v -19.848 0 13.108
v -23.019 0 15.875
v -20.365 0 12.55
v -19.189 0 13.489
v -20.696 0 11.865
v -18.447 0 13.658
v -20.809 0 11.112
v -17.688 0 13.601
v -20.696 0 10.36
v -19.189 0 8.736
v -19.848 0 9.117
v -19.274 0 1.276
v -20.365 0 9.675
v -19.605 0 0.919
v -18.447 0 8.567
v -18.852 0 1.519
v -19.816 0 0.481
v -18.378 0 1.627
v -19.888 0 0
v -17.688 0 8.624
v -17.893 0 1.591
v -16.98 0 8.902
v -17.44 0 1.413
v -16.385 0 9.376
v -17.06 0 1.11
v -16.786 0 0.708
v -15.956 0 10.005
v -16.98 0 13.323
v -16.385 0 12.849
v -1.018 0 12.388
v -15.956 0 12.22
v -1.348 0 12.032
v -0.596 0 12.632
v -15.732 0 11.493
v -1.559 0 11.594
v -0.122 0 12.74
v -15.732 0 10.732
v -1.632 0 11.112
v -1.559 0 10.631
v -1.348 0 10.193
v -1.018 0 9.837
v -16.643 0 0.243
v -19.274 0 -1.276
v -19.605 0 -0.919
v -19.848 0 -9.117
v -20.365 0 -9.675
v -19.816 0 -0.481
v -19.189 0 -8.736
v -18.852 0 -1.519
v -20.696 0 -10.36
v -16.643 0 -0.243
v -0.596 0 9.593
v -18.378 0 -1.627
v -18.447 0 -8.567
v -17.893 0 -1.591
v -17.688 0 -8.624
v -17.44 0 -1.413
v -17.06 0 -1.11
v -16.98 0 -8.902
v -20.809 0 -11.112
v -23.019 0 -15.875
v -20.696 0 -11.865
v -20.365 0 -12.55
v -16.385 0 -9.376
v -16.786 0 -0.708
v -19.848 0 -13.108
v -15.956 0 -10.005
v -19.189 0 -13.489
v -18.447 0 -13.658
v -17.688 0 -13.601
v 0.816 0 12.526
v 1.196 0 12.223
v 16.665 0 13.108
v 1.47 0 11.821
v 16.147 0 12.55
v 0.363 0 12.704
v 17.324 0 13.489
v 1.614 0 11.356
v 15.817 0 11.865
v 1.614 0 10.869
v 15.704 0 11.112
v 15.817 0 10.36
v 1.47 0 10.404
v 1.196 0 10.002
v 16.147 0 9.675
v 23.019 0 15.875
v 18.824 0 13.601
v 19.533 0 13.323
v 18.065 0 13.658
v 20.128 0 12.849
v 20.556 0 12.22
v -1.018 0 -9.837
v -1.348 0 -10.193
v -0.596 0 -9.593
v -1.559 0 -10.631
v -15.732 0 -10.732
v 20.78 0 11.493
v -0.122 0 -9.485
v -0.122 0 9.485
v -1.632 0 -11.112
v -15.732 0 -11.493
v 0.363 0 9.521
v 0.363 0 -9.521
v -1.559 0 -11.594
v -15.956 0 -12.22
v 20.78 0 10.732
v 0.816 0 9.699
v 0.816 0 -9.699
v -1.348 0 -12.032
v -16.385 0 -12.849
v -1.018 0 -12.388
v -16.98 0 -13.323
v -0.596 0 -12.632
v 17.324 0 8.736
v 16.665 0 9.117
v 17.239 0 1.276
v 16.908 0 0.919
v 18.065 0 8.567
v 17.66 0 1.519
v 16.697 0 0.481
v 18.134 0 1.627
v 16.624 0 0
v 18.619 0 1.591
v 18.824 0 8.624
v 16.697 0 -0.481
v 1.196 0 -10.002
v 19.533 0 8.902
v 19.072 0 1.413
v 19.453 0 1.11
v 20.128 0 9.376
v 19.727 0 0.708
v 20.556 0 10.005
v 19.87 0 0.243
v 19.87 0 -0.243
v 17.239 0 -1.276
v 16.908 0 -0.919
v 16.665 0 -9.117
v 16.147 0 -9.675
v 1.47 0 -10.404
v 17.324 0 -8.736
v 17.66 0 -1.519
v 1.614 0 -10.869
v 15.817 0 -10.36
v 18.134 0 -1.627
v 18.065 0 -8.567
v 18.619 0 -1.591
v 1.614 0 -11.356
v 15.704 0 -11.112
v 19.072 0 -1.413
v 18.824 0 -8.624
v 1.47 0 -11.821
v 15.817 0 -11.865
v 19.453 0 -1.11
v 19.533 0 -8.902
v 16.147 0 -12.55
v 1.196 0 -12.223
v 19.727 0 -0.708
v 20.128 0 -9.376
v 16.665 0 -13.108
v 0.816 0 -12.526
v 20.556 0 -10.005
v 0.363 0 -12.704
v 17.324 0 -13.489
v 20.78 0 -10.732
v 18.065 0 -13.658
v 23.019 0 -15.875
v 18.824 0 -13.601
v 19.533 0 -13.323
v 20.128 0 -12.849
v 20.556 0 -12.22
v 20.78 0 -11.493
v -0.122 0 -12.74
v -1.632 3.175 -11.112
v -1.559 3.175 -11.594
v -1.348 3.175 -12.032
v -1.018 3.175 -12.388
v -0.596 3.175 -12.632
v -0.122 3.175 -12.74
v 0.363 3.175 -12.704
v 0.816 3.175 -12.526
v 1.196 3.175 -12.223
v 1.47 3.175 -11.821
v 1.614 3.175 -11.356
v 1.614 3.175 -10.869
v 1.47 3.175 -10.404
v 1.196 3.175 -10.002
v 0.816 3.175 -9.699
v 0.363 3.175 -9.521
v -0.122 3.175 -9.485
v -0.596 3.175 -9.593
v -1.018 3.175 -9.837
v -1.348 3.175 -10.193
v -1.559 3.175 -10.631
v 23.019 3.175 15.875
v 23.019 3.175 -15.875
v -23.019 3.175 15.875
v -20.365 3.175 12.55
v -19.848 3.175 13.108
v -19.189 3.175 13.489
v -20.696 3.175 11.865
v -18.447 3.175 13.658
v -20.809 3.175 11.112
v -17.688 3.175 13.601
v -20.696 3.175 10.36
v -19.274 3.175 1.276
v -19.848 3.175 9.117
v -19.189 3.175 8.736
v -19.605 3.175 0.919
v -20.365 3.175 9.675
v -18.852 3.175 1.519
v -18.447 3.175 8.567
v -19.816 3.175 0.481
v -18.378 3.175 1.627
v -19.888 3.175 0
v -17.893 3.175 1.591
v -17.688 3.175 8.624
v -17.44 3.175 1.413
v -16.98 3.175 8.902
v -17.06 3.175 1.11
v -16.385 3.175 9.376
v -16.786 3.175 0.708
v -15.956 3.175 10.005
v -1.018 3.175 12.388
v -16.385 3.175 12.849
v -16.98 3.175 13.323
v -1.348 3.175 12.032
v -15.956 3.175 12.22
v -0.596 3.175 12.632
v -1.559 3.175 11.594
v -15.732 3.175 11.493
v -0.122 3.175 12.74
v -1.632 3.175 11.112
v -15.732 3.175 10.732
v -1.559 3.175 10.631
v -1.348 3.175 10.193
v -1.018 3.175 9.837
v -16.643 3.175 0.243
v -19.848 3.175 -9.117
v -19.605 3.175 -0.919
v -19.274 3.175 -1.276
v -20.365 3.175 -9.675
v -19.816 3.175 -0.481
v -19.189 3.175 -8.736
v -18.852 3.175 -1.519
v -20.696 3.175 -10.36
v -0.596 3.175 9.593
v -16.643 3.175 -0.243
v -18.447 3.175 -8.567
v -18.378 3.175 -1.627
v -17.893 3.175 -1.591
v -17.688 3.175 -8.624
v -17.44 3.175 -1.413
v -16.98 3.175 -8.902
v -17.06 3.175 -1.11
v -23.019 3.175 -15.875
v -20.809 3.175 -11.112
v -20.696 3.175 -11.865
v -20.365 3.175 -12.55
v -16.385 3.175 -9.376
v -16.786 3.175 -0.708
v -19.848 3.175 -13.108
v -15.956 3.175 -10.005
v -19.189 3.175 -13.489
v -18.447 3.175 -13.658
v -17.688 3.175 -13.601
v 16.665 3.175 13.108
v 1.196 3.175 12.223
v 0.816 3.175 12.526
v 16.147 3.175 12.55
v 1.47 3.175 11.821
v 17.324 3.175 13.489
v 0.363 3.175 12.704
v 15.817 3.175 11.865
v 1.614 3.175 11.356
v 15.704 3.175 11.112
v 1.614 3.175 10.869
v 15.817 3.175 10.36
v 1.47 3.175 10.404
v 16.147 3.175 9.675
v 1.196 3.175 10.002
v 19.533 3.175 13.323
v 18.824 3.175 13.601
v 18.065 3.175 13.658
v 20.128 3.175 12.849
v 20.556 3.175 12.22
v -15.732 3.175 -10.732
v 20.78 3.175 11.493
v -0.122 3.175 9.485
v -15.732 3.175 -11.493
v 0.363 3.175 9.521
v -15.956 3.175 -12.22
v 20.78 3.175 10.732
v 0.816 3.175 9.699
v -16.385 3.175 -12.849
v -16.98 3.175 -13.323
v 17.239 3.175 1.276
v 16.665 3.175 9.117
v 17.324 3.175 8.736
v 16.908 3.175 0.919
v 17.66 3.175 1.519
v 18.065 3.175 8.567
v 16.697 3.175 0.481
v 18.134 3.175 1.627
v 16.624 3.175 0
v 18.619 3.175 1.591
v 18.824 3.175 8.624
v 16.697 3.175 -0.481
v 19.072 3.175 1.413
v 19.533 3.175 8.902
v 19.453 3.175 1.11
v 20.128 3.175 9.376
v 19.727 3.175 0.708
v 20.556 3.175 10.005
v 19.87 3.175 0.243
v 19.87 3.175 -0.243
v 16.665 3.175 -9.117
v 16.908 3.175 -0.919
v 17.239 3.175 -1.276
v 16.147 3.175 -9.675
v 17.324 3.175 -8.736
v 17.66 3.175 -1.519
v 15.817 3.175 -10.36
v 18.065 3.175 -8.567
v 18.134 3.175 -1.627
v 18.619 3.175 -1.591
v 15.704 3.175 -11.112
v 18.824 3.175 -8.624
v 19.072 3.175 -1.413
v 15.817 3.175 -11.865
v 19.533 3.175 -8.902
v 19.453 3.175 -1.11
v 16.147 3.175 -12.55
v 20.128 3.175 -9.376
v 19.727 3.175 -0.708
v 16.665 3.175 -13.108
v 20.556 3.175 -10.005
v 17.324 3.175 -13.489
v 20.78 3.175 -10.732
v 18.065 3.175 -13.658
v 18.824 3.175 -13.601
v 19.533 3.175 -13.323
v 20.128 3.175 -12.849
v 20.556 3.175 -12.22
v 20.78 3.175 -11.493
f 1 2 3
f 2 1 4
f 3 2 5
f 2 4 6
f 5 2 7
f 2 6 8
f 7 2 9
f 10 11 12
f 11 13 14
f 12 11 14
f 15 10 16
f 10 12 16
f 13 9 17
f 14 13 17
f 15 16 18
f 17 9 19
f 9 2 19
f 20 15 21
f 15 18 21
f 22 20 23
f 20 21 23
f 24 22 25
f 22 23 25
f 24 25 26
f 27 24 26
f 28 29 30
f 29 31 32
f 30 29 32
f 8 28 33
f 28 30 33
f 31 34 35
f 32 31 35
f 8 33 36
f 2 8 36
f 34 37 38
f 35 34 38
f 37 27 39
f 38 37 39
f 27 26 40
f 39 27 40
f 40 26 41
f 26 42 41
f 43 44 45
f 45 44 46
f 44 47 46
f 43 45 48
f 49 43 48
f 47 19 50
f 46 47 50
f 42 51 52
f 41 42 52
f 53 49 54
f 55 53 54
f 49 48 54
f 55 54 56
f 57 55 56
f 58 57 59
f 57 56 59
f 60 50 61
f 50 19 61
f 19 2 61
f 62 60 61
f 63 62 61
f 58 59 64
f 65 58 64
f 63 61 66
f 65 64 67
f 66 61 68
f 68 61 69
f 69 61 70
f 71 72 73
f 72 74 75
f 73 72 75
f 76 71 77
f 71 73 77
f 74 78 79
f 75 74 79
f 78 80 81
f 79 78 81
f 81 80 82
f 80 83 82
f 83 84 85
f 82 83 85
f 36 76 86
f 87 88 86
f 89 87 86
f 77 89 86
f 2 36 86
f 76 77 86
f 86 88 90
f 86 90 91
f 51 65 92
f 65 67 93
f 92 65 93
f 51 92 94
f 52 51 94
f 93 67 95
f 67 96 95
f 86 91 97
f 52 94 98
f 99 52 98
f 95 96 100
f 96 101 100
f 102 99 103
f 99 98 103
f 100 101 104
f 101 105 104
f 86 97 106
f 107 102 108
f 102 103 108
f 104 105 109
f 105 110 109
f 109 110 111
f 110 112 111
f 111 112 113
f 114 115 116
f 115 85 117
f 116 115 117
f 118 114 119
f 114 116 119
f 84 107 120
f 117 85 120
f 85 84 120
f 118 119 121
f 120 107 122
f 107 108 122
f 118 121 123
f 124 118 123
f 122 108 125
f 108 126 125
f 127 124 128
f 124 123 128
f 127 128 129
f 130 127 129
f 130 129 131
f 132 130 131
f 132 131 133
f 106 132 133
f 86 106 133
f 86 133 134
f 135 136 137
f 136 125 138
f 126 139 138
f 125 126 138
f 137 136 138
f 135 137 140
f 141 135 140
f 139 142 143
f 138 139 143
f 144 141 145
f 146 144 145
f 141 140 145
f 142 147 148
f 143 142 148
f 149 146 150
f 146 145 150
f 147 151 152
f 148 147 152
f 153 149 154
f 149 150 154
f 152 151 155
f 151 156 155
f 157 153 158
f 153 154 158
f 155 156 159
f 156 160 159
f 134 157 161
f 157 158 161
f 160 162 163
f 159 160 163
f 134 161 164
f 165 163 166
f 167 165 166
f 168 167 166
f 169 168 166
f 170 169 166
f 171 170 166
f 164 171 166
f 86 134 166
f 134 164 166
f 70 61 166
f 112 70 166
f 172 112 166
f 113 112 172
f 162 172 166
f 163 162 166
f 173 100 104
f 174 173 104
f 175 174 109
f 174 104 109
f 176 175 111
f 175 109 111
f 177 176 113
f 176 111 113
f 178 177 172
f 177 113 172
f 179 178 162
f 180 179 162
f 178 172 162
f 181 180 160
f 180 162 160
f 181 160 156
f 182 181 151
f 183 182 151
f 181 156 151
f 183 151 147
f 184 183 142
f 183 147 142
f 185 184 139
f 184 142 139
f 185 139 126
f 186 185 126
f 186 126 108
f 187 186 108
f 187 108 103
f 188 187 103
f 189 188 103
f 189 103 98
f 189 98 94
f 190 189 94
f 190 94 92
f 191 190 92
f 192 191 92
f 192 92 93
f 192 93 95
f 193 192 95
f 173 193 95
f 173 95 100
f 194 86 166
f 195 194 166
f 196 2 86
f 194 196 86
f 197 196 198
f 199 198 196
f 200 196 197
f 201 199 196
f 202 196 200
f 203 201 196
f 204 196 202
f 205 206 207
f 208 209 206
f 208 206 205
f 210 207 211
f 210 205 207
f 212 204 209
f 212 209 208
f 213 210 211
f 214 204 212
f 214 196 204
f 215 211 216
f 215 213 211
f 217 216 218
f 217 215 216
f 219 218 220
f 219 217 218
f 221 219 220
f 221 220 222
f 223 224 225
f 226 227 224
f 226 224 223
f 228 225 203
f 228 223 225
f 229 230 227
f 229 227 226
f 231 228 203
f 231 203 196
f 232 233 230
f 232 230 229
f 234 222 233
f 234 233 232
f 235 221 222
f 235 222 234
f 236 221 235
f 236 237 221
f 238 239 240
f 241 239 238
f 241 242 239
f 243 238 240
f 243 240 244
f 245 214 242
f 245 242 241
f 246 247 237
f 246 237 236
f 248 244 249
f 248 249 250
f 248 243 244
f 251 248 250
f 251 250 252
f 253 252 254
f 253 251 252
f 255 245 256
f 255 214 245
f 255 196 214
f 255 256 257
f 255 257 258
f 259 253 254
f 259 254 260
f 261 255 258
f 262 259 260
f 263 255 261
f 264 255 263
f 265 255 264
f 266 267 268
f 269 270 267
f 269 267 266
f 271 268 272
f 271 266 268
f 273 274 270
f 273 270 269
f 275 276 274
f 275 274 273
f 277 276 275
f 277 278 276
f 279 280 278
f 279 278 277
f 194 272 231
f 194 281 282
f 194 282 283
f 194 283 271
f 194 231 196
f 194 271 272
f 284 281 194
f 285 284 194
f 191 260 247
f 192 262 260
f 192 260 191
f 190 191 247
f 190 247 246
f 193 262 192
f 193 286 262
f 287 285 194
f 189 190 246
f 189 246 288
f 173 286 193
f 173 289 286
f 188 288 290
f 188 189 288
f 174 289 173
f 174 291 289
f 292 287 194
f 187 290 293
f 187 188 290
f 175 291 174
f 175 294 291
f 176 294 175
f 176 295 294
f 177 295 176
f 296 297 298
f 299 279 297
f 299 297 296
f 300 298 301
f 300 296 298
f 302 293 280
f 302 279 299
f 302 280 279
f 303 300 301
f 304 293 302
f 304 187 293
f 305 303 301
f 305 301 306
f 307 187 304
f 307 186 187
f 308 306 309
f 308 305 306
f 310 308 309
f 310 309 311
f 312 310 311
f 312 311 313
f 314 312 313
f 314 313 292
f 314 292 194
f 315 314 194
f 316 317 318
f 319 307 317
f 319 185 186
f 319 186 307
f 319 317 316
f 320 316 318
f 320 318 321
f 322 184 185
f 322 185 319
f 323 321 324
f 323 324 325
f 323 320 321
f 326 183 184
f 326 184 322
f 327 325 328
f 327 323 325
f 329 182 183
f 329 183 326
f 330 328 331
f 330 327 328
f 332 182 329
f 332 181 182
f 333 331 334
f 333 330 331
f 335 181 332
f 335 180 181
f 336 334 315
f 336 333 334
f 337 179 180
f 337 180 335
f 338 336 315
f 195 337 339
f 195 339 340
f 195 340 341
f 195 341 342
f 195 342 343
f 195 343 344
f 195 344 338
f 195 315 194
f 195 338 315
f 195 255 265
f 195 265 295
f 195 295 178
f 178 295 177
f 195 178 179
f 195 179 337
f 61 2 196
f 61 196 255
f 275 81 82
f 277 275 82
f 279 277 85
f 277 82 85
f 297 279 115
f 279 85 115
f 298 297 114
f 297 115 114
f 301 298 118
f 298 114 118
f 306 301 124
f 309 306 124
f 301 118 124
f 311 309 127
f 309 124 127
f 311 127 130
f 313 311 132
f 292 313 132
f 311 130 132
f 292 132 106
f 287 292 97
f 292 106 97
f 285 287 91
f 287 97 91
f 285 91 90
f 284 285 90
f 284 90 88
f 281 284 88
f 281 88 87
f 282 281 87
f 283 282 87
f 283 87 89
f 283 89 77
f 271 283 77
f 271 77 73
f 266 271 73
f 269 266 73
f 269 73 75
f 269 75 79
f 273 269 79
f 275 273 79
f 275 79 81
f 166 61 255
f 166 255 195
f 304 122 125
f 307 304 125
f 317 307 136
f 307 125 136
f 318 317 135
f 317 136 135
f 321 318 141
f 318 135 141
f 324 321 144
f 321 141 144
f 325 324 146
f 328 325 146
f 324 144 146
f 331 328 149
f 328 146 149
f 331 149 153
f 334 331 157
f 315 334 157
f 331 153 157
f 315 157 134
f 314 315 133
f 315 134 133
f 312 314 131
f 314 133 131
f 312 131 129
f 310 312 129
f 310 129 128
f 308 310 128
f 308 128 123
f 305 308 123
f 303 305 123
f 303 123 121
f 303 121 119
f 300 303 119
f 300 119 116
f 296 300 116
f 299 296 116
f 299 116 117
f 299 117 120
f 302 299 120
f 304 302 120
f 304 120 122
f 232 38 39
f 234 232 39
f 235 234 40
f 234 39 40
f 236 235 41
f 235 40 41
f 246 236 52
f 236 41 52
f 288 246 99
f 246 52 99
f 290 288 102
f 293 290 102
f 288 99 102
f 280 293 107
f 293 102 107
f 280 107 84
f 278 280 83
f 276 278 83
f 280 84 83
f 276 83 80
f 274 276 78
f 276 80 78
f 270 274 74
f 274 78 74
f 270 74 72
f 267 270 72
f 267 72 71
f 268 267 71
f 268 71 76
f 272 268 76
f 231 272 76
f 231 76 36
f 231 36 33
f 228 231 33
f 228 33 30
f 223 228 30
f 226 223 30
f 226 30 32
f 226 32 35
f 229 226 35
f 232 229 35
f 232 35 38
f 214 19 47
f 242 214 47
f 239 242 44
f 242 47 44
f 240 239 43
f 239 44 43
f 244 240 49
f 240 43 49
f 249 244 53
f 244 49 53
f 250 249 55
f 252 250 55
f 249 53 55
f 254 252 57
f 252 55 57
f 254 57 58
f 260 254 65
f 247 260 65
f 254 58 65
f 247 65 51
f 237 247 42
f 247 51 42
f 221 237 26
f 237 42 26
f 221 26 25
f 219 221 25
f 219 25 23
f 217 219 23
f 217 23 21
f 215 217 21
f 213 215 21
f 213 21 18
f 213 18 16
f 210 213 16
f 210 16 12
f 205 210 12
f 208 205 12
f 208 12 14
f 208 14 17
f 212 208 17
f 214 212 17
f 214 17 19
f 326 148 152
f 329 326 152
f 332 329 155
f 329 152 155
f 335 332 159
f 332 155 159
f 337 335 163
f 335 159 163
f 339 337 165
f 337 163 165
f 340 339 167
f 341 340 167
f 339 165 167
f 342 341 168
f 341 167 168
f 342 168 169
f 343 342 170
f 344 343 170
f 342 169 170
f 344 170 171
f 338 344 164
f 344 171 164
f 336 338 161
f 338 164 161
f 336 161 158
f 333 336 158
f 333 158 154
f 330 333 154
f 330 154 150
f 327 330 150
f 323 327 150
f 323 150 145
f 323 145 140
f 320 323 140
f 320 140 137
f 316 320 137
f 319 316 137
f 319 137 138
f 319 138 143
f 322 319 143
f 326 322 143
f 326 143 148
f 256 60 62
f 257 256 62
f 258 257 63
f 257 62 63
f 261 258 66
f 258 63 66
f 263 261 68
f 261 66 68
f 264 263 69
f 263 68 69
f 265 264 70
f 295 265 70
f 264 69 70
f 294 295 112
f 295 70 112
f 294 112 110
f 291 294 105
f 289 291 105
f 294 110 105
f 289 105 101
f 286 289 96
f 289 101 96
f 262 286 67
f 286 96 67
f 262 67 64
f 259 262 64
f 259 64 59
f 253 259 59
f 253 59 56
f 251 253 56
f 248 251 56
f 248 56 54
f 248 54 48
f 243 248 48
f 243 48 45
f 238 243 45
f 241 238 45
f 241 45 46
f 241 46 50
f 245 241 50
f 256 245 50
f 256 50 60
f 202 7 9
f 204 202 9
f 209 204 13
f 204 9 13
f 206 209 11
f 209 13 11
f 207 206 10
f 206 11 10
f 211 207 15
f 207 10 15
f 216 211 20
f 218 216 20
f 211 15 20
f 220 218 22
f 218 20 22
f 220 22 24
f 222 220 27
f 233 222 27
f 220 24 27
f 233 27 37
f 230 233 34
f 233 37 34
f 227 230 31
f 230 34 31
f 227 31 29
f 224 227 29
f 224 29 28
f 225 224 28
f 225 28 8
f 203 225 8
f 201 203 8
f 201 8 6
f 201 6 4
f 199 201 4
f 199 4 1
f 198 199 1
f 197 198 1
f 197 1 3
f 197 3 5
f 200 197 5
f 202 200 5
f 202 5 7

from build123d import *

# Parameters (mm, degrees)
SKETCH1_W              = 46.0375
SKETCH1_H              = 31.75
BOSS_EXTRUDE1_DEPTH    = 3.175
F_10_CLEARANCE_HOLE1_D = 5.1054
F_4_CLEARANCE_HOLE1_D  = 3.2639


with BuildPart() as part:
    # Sketch1 → Boss-Extrude1 (new body)
    with BuildSketch(Plane(origin=(0, 0, 0), x_dir=(1, 0, 0), z_dir=(0, 1, 0))):
        Rectangle(SKETCH1_W, SKETCH1_H)
    extrude(amount=BOSS_EXTRUDE1_DEPTH)

    # #10 Clearance Hole1 (through all)
    with Locations(Plane(origin=(0, 3.175, 0), x_dir=(1, 0, 0), z_dir=(0, 1, 0))):
        with Locations((-18.25625, 11.1125), (-18.25625, -11.1125), (18.25625, -11.1125), (18.25625, 11.1125)):
            Hole(F_10_CLEARANCE_HOLE1_D / 2)

    # #4 Clearance Hole1 (through all)
    with Locations(Plane(origin=(0, 3.175, 0), x_dir=(1, 0, 0), z_dir=(0, 1, 0))):
        with Locations((0, 11.1125), (0, -11.1125), (-18.25625, 0), (18.25625, 0)):
            Hole(F_4_CLEARANCE_HOLE1_D / 2)


solid = part.part
